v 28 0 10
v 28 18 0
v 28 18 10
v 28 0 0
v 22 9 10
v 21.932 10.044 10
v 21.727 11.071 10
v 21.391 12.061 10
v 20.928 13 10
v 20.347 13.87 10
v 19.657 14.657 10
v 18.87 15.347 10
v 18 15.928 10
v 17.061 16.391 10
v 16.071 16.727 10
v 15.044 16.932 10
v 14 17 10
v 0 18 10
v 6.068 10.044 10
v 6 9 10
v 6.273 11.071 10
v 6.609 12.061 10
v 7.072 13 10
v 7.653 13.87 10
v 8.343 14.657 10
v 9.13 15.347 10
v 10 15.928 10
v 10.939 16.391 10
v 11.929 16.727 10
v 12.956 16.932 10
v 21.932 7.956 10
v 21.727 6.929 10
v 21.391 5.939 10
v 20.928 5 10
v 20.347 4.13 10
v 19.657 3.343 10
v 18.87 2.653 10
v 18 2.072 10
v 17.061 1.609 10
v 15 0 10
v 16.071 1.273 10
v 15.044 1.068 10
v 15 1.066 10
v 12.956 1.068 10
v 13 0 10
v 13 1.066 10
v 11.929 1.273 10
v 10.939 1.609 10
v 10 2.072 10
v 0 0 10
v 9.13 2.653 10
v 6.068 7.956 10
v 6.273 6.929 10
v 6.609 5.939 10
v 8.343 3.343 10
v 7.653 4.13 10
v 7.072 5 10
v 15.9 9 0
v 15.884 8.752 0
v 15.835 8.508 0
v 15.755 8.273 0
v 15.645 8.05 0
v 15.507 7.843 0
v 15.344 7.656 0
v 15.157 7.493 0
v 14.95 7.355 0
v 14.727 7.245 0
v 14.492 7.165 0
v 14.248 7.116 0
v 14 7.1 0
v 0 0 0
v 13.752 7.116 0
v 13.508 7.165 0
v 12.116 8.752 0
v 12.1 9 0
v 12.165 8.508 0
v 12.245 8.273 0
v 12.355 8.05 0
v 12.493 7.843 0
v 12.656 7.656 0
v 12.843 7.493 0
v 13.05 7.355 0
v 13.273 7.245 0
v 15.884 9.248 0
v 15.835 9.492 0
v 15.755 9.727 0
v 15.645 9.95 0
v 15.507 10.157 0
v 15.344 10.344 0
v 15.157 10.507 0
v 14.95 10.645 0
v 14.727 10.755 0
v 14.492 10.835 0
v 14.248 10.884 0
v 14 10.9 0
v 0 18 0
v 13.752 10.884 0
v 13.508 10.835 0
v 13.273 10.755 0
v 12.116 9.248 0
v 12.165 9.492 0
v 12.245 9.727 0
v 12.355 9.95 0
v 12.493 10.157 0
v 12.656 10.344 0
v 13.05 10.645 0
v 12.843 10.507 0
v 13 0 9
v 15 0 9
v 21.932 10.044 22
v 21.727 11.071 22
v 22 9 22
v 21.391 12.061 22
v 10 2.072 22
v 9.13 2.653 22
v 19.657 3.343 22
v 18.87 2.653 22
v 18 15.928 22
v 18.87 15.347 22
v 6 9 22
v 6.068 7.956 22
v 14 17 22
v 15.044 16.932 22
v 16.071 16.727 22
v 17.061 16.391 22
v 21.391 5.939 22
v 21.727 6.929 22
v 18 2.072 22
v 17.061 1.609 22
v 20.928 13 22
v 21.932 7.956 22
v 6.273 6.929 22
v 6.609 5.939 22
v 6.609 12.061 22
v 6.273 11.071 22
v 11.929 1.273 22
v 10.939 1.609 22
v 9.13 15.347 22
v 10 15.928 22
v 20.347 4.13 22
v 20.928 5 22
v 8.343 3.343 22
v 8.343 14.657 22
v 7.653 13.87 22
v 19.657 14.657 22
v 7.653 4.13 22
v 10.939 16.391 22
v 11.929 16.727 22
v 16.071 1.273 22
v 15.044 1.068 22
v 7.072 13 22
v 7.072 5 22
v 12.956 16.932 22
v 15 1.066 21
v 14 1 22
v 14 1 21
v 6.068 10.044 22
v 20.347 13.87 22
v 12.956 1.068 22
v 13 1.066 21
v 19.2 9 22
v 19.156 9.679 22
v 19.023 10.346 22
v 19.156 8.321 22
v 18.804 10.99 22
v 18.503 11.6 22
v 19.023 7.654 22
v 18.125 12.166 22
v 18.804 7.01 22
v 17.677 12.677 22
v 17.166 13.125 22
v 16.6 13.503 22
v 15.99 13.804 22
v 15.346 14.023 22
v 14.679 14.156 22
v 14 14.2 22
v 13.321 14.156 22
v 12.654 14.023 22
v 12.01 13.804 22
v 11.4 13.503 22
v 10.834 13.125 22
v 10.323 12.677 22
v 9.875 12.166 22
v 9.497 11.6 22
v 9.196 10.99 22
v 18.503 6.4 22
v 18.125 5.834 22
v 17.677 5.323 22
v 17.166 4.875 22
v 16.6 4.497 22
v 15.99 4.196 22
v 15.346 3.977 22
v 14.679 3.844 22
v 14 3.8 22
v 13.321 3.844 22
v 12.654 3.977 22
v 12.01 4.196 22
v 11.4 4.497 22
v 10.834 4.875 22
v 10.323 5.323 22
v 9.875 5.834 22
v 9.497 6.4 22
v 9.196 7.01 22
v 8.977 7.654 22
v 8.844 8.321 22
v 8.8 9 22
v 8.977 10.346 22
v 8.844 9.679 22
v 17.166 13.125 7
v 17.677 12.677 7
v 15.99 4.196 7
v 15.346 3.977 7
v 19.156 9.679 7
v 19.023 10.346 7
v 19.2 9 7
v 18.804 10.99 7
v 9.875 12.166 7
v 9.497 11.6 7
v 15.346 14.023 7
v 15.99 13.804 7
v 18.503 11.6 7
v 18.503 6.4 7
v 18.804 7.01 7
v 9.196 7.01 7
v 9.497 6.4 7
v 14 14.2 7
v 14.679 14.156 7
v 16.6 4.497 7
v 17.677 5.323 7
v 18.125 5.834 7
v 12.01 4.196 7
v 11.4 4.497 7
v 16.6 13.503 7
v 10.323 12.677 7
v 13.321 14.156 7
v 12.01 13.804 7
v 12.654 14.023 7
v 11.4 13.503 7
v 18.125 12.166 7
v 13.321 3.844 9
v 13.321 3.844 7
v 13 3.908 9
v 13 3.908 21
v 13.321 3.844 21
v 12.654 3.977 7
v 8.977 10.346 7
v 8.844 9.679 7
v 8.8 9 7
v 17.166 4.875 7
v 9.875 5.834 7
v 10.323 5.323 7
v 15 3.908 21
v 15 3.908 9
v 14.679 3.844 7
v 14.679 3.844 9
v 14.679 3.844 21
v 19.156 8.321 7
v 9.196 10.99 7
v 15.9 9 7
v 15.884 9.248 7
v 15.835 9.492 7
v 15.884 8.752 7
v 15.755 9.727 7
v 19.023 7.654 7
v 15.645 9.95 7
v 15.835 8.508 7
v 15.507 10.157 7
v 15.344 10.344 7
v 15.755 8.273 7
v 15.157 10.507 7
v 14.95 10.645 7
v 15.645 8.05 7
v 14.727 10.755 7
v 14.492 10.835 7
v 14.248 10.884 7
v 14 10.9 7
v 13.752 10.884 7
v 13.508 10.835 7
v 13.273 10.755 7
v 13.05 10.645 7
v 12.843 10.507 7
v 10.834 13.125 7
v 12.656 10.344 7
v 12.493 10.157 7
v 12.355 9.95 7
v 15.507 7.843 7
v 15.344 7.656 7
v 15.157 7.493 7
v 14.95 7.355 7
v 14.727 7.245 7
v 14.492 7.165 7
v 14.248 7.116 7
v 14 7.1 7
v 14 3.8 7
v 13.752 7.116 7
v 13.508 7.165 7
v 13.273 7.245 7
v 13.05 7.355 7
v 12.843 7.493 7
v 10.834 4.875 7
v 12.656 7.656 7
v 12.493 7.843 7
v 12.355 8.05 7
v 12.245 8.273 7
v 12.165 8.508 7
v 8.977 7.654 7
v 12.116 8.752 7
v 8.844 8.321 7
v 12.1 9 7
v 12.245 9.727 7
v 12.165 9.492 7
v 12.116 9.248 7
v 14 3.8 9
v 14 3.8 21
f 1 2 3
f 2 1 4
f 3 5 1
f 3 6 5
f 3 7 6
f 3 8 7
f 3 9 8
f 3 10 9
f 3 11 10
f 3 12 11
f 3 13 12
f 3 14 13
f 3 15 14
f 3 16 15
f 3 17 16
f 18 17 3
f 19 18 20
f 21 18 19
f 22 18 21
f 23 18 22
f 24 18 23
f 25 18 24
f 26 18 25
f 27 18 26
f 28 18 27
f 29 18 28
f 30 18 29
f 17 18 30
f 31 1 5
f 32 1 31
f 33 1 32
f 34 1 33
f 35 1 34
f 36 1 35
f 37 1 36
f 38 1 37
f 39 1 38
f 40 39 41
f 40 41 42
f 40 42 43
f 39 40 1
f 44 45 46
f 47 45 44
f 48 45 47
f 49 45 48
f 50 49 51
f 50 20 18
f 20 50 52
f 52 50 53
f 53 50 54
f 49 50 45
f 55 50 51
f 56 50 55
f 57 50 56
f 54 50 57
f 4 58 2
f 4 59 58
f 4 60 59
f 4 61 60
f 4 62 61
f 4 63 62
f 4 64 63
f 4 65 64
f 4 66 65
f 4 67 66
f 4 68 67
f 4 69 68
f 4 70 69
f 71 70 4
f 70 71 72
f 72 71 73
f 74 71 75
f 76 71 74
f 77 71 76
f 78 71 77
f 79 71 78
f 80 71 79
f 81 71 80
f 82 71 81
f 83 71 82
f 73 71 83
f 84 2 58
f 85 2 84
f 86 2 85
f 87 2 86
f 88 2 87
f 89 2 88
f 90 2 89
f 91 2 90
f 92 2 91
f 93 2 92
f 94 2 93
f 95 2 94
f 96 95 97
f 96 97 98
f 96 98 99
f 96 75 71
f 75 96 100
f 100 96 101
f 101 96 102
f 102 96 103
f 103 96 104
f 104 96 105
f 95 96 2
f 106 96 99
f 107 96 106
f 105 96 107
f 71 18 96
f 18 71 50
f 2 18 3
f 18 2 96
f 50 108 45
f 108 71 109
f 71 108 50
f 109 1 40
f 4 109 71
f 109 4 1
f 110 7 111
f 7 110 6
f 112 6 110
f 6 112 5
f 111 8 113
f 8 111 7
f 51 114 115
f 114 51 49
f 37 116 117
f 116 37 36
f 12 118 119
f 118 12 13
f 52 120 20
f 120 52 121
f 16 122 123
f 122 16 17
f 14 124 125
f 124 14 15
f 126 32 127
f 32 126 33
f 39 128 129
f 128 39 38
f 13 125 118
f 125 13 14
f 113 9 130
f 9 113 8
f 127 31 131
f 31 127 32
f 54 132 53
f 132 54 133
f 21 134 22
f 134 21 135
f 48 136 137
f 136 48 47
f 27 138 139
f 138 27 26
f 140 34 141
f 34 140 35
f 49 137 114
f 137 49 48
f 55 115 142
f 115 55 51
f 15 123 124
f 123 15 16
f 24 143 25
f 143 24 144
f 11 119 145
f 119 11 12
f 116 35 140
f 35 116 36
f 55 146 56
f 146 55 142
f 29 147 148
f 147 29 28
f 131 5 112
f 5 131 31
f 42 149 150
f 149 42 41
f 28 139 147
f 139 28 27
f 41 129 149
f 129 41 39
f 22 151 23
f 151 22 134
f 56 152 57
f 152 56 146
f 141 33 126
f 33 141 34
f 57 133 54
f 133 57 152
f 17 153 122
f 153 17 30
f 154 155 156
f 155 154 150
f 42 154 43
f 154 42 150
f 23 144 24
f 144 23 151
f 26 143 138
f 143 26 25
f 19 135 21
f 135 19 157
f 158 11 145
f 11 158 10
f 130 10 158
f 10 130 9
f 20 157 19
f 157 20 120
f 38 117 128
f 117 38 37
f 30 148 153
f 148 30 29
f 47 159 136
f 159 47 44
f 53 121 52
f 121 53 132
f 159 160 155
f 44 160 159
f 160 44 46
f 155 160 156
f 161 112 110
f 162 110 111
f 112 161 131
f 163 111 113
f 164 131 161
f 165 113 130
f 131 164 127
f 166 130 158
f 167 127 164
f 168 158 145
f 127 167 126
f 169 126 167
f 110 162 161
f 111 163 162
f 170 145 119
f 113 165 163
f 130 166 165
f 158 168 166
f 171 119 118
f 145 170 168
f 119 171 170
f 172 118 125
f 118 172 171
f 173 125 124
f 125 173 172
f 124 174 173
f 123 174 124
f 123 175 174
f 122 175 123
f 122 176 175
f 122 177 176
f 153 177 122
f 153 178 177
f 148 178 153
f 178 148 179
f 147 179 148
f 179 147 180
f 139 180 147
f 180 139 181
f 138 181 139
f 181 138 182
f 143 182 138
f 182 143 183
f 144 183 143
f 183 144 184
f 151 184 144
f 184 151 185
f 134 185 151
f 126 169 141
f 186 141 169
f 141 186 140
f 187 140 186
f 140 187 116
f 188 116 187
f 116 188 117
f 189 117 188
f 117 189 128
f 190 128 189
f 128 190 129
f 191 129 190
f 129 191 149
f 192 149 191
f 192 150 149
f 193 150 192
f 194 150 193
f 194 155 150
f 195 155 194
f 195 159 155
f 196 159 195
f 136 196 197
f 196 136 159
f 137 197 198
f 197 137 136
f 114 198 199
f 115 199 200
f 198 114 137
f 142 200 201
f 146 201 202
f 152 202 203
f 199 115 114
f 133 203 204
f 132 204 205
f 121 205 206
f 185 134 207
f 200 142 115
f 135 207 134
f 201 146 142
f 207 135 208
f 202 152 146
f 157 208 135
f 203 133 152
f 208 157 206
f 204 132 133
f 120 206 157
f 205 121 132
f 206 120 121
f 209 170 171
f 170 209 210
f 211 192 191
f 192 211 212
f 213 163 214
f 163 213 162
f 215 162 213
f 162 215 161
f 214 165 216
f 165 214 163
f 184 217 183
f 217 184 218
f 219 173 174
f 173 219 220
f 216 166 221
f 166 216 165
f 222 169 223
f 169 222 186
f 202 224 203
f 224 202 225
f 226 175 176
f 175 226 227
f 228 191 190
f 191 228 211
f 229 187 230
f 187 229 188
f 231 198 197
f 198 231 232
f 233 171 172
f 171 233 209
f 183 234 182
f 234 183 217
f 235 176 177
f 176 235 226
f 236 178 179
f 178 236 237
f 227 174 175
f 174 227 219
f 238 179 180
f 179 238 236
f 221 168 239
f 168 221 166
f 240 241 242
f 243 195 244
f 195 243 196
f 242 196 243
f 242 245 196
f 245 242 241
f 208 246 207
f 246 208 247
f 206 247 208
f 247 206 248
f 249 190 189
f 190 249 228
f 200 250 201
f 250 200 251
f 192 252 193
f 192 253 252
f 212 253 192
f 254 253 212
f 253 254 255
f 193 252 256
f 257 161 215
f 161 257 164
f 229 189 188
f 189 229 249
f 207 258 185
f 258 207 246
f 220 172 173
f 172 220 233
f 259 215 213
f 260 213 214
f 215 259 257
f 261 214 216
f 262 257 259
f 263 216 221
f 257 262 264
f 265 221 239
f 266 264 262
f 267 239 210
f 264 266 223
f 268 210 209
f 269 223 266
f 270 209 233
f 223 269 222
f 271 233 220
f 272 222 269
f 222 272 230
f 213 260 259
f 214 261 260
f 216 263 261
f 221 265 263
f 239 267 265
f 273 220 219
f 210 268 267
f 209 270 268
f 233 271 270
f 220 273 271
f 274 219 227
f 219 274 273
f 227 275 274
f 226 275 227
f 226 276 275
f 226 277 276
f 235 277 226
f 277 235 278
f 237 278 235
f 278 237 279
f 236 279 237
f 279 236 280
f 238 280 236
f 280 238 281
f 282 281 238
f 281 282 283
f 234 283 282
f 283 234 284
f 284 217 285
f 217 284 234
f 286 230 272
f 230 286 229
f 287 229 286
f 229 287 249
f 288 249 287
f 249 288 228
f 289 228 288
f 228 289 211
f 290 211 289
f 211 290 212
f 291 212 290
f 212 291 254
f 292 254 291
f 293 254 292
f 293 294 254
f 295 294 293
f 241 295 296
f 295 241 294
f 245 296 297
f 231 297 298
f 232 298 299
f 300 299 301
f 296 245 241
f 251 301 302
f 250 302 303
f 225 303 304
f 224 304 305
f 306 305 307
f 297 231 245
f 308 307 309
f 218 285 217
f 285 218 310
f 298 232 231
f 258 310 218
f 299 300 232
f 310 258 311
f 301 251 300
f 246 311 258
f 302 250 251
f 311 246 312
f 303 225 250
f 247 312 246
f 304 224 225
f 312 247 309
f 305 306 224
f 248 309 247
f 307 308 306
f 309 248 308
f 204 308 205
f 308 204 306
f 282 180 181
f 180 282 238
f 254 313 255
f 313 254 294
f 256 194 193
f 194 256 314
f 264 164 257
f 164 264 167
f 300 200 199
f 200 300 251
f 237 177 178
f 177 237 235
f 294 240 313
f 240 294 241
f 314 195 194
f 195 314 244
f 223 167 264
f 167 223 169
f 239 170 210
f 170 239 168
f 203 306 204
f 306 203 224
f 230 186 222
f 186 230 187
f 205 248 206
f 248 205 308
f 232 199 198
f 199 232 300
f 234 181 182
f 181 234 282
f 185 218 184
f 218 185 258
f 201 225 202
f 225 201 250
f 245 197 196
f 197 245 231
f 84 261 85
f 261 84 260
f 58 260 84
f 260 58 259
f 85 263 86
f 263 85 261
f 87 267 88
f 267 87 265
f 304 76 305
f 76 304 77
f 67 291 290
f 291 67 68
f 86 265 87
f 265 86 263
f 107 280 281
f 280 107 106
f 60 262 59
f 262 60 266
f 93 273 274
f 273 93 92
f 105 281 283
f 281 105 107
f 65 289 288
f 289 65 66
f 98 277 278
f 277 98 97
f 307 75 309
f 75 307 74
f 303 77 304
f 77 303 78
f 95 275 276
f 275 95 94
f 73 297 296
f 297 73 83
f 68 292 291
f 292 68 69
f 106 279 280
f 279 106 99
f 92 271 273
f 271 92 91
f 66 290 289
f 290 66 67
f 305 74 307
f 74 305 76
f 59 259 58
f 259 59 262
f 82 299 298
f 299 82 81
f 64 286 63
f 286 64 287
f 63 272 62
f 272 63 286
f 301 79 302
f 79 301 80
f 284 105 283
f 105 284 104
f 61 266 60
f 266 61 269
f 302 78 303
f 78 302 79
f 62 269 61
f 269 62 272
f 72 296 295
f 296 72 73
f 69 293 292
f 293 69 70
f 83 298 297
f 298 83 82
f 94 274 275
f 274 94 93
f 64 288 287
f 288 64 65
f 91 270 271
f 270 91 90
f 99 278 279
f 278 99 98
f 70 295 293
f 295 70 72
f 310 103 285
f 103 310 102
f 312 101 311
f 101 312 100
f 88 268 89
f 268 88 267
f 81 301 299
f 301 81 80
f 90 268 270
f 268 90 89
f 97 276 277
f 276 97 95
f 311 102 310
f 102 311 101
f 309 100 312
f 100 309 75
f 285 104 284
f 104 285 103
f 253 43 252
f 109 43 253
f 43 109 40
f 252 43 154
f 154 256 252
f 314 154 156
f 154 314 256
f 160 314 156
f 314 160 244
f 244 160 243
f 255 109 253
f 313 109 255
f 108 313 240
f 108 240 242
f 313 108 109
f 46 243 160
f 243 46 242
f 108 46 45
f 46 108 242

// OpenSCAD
$fn=48;
difference(){union(){cube([28,18,10]);translate([14,9,10])cylinder(h=12,r=8);}translate([14,9,7])cylinder(h=18,r=5.2);translate([14,9,-1])cylinder(h=13,r=1.9);translate([14,-1,15])cube([2,20,12],center=true);}
